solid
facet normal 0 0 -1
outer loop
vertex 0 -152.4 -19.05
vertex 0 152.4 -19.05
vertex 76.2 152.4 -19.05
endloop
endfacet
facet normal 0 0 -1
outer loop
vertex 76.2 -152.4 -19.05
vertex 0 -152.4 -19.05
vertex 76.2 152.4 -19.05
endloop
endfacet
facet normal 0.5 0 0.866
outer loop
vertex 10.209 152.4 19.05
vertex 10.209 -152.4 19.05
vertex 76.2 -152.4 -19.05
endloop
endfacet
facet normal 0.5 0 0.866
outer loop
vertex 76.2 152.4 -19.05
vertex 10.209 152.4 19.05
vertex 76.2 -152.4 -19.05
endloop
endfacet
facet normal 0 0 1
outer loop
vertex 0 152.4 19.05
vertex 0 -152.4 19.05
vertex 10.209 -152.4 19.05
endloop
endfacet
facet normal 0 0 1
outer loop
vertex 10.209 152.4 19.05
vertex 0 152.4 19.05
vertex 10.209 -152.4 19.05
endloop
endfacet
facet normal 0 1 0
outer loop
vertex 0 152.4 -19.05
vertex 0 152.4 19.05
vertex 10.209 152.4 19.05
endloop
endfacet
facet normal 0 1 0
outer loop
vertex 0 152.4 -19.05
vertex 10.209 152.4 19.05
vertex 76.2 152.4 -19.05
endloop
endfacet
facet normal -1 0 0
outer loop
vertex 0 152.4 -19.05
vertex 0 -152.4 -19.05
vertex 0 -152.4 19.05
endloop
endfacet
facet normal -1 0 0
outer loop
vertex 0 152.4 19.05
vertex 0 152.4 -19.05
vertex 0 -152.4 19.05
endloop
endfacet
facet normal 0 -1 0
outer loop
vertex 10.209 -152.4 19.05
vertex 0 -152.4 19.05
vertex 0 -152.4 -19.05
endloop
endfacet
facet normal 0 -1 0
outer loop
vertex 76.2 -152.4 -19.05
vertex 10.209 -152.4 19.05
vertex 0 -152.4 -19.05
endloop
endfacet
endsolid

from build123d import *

# Parameters (mm, degrees)
F0_W     = 152.4
F0_H     = 38.1
F1_DEPTH = 152.4
F3_DEPTH = 304.801
F4_W     = 76.2
F4_H     = 38.1
F5_DEPTH = 304.801


with BuildPart() as f1:
    # F0 (on Front) → F1 (new body, symmetric)
    with BuildSketch(Plane.XZ):
        Rectangle(F0_W, F0_H)
    extrude(amount=F1_DEPTH, both=True)

    # F2 (on face) → F3 (cut, through all)
    with BuildSketch(Plane.XZ.offset(152.4)):
        Polygon((76.2, 19.05), (10.2088642316, 19.05), (76.2, -19.05), align=None)
    extrude(amount=-F3_DEPTH, mode=Mode.SUBTRACT)

    # F4 (on face) → F5 (cut, through all)
    with BuildSketch(Plane.XZ.offset(152.4)):
        with Locations((-38.1, 0)):
            Rectangle(F4_W, F4_H)
    extrude(amount=-F5_DEPTH, mode=Mode.SUBTRACT)


solid = f1.part
